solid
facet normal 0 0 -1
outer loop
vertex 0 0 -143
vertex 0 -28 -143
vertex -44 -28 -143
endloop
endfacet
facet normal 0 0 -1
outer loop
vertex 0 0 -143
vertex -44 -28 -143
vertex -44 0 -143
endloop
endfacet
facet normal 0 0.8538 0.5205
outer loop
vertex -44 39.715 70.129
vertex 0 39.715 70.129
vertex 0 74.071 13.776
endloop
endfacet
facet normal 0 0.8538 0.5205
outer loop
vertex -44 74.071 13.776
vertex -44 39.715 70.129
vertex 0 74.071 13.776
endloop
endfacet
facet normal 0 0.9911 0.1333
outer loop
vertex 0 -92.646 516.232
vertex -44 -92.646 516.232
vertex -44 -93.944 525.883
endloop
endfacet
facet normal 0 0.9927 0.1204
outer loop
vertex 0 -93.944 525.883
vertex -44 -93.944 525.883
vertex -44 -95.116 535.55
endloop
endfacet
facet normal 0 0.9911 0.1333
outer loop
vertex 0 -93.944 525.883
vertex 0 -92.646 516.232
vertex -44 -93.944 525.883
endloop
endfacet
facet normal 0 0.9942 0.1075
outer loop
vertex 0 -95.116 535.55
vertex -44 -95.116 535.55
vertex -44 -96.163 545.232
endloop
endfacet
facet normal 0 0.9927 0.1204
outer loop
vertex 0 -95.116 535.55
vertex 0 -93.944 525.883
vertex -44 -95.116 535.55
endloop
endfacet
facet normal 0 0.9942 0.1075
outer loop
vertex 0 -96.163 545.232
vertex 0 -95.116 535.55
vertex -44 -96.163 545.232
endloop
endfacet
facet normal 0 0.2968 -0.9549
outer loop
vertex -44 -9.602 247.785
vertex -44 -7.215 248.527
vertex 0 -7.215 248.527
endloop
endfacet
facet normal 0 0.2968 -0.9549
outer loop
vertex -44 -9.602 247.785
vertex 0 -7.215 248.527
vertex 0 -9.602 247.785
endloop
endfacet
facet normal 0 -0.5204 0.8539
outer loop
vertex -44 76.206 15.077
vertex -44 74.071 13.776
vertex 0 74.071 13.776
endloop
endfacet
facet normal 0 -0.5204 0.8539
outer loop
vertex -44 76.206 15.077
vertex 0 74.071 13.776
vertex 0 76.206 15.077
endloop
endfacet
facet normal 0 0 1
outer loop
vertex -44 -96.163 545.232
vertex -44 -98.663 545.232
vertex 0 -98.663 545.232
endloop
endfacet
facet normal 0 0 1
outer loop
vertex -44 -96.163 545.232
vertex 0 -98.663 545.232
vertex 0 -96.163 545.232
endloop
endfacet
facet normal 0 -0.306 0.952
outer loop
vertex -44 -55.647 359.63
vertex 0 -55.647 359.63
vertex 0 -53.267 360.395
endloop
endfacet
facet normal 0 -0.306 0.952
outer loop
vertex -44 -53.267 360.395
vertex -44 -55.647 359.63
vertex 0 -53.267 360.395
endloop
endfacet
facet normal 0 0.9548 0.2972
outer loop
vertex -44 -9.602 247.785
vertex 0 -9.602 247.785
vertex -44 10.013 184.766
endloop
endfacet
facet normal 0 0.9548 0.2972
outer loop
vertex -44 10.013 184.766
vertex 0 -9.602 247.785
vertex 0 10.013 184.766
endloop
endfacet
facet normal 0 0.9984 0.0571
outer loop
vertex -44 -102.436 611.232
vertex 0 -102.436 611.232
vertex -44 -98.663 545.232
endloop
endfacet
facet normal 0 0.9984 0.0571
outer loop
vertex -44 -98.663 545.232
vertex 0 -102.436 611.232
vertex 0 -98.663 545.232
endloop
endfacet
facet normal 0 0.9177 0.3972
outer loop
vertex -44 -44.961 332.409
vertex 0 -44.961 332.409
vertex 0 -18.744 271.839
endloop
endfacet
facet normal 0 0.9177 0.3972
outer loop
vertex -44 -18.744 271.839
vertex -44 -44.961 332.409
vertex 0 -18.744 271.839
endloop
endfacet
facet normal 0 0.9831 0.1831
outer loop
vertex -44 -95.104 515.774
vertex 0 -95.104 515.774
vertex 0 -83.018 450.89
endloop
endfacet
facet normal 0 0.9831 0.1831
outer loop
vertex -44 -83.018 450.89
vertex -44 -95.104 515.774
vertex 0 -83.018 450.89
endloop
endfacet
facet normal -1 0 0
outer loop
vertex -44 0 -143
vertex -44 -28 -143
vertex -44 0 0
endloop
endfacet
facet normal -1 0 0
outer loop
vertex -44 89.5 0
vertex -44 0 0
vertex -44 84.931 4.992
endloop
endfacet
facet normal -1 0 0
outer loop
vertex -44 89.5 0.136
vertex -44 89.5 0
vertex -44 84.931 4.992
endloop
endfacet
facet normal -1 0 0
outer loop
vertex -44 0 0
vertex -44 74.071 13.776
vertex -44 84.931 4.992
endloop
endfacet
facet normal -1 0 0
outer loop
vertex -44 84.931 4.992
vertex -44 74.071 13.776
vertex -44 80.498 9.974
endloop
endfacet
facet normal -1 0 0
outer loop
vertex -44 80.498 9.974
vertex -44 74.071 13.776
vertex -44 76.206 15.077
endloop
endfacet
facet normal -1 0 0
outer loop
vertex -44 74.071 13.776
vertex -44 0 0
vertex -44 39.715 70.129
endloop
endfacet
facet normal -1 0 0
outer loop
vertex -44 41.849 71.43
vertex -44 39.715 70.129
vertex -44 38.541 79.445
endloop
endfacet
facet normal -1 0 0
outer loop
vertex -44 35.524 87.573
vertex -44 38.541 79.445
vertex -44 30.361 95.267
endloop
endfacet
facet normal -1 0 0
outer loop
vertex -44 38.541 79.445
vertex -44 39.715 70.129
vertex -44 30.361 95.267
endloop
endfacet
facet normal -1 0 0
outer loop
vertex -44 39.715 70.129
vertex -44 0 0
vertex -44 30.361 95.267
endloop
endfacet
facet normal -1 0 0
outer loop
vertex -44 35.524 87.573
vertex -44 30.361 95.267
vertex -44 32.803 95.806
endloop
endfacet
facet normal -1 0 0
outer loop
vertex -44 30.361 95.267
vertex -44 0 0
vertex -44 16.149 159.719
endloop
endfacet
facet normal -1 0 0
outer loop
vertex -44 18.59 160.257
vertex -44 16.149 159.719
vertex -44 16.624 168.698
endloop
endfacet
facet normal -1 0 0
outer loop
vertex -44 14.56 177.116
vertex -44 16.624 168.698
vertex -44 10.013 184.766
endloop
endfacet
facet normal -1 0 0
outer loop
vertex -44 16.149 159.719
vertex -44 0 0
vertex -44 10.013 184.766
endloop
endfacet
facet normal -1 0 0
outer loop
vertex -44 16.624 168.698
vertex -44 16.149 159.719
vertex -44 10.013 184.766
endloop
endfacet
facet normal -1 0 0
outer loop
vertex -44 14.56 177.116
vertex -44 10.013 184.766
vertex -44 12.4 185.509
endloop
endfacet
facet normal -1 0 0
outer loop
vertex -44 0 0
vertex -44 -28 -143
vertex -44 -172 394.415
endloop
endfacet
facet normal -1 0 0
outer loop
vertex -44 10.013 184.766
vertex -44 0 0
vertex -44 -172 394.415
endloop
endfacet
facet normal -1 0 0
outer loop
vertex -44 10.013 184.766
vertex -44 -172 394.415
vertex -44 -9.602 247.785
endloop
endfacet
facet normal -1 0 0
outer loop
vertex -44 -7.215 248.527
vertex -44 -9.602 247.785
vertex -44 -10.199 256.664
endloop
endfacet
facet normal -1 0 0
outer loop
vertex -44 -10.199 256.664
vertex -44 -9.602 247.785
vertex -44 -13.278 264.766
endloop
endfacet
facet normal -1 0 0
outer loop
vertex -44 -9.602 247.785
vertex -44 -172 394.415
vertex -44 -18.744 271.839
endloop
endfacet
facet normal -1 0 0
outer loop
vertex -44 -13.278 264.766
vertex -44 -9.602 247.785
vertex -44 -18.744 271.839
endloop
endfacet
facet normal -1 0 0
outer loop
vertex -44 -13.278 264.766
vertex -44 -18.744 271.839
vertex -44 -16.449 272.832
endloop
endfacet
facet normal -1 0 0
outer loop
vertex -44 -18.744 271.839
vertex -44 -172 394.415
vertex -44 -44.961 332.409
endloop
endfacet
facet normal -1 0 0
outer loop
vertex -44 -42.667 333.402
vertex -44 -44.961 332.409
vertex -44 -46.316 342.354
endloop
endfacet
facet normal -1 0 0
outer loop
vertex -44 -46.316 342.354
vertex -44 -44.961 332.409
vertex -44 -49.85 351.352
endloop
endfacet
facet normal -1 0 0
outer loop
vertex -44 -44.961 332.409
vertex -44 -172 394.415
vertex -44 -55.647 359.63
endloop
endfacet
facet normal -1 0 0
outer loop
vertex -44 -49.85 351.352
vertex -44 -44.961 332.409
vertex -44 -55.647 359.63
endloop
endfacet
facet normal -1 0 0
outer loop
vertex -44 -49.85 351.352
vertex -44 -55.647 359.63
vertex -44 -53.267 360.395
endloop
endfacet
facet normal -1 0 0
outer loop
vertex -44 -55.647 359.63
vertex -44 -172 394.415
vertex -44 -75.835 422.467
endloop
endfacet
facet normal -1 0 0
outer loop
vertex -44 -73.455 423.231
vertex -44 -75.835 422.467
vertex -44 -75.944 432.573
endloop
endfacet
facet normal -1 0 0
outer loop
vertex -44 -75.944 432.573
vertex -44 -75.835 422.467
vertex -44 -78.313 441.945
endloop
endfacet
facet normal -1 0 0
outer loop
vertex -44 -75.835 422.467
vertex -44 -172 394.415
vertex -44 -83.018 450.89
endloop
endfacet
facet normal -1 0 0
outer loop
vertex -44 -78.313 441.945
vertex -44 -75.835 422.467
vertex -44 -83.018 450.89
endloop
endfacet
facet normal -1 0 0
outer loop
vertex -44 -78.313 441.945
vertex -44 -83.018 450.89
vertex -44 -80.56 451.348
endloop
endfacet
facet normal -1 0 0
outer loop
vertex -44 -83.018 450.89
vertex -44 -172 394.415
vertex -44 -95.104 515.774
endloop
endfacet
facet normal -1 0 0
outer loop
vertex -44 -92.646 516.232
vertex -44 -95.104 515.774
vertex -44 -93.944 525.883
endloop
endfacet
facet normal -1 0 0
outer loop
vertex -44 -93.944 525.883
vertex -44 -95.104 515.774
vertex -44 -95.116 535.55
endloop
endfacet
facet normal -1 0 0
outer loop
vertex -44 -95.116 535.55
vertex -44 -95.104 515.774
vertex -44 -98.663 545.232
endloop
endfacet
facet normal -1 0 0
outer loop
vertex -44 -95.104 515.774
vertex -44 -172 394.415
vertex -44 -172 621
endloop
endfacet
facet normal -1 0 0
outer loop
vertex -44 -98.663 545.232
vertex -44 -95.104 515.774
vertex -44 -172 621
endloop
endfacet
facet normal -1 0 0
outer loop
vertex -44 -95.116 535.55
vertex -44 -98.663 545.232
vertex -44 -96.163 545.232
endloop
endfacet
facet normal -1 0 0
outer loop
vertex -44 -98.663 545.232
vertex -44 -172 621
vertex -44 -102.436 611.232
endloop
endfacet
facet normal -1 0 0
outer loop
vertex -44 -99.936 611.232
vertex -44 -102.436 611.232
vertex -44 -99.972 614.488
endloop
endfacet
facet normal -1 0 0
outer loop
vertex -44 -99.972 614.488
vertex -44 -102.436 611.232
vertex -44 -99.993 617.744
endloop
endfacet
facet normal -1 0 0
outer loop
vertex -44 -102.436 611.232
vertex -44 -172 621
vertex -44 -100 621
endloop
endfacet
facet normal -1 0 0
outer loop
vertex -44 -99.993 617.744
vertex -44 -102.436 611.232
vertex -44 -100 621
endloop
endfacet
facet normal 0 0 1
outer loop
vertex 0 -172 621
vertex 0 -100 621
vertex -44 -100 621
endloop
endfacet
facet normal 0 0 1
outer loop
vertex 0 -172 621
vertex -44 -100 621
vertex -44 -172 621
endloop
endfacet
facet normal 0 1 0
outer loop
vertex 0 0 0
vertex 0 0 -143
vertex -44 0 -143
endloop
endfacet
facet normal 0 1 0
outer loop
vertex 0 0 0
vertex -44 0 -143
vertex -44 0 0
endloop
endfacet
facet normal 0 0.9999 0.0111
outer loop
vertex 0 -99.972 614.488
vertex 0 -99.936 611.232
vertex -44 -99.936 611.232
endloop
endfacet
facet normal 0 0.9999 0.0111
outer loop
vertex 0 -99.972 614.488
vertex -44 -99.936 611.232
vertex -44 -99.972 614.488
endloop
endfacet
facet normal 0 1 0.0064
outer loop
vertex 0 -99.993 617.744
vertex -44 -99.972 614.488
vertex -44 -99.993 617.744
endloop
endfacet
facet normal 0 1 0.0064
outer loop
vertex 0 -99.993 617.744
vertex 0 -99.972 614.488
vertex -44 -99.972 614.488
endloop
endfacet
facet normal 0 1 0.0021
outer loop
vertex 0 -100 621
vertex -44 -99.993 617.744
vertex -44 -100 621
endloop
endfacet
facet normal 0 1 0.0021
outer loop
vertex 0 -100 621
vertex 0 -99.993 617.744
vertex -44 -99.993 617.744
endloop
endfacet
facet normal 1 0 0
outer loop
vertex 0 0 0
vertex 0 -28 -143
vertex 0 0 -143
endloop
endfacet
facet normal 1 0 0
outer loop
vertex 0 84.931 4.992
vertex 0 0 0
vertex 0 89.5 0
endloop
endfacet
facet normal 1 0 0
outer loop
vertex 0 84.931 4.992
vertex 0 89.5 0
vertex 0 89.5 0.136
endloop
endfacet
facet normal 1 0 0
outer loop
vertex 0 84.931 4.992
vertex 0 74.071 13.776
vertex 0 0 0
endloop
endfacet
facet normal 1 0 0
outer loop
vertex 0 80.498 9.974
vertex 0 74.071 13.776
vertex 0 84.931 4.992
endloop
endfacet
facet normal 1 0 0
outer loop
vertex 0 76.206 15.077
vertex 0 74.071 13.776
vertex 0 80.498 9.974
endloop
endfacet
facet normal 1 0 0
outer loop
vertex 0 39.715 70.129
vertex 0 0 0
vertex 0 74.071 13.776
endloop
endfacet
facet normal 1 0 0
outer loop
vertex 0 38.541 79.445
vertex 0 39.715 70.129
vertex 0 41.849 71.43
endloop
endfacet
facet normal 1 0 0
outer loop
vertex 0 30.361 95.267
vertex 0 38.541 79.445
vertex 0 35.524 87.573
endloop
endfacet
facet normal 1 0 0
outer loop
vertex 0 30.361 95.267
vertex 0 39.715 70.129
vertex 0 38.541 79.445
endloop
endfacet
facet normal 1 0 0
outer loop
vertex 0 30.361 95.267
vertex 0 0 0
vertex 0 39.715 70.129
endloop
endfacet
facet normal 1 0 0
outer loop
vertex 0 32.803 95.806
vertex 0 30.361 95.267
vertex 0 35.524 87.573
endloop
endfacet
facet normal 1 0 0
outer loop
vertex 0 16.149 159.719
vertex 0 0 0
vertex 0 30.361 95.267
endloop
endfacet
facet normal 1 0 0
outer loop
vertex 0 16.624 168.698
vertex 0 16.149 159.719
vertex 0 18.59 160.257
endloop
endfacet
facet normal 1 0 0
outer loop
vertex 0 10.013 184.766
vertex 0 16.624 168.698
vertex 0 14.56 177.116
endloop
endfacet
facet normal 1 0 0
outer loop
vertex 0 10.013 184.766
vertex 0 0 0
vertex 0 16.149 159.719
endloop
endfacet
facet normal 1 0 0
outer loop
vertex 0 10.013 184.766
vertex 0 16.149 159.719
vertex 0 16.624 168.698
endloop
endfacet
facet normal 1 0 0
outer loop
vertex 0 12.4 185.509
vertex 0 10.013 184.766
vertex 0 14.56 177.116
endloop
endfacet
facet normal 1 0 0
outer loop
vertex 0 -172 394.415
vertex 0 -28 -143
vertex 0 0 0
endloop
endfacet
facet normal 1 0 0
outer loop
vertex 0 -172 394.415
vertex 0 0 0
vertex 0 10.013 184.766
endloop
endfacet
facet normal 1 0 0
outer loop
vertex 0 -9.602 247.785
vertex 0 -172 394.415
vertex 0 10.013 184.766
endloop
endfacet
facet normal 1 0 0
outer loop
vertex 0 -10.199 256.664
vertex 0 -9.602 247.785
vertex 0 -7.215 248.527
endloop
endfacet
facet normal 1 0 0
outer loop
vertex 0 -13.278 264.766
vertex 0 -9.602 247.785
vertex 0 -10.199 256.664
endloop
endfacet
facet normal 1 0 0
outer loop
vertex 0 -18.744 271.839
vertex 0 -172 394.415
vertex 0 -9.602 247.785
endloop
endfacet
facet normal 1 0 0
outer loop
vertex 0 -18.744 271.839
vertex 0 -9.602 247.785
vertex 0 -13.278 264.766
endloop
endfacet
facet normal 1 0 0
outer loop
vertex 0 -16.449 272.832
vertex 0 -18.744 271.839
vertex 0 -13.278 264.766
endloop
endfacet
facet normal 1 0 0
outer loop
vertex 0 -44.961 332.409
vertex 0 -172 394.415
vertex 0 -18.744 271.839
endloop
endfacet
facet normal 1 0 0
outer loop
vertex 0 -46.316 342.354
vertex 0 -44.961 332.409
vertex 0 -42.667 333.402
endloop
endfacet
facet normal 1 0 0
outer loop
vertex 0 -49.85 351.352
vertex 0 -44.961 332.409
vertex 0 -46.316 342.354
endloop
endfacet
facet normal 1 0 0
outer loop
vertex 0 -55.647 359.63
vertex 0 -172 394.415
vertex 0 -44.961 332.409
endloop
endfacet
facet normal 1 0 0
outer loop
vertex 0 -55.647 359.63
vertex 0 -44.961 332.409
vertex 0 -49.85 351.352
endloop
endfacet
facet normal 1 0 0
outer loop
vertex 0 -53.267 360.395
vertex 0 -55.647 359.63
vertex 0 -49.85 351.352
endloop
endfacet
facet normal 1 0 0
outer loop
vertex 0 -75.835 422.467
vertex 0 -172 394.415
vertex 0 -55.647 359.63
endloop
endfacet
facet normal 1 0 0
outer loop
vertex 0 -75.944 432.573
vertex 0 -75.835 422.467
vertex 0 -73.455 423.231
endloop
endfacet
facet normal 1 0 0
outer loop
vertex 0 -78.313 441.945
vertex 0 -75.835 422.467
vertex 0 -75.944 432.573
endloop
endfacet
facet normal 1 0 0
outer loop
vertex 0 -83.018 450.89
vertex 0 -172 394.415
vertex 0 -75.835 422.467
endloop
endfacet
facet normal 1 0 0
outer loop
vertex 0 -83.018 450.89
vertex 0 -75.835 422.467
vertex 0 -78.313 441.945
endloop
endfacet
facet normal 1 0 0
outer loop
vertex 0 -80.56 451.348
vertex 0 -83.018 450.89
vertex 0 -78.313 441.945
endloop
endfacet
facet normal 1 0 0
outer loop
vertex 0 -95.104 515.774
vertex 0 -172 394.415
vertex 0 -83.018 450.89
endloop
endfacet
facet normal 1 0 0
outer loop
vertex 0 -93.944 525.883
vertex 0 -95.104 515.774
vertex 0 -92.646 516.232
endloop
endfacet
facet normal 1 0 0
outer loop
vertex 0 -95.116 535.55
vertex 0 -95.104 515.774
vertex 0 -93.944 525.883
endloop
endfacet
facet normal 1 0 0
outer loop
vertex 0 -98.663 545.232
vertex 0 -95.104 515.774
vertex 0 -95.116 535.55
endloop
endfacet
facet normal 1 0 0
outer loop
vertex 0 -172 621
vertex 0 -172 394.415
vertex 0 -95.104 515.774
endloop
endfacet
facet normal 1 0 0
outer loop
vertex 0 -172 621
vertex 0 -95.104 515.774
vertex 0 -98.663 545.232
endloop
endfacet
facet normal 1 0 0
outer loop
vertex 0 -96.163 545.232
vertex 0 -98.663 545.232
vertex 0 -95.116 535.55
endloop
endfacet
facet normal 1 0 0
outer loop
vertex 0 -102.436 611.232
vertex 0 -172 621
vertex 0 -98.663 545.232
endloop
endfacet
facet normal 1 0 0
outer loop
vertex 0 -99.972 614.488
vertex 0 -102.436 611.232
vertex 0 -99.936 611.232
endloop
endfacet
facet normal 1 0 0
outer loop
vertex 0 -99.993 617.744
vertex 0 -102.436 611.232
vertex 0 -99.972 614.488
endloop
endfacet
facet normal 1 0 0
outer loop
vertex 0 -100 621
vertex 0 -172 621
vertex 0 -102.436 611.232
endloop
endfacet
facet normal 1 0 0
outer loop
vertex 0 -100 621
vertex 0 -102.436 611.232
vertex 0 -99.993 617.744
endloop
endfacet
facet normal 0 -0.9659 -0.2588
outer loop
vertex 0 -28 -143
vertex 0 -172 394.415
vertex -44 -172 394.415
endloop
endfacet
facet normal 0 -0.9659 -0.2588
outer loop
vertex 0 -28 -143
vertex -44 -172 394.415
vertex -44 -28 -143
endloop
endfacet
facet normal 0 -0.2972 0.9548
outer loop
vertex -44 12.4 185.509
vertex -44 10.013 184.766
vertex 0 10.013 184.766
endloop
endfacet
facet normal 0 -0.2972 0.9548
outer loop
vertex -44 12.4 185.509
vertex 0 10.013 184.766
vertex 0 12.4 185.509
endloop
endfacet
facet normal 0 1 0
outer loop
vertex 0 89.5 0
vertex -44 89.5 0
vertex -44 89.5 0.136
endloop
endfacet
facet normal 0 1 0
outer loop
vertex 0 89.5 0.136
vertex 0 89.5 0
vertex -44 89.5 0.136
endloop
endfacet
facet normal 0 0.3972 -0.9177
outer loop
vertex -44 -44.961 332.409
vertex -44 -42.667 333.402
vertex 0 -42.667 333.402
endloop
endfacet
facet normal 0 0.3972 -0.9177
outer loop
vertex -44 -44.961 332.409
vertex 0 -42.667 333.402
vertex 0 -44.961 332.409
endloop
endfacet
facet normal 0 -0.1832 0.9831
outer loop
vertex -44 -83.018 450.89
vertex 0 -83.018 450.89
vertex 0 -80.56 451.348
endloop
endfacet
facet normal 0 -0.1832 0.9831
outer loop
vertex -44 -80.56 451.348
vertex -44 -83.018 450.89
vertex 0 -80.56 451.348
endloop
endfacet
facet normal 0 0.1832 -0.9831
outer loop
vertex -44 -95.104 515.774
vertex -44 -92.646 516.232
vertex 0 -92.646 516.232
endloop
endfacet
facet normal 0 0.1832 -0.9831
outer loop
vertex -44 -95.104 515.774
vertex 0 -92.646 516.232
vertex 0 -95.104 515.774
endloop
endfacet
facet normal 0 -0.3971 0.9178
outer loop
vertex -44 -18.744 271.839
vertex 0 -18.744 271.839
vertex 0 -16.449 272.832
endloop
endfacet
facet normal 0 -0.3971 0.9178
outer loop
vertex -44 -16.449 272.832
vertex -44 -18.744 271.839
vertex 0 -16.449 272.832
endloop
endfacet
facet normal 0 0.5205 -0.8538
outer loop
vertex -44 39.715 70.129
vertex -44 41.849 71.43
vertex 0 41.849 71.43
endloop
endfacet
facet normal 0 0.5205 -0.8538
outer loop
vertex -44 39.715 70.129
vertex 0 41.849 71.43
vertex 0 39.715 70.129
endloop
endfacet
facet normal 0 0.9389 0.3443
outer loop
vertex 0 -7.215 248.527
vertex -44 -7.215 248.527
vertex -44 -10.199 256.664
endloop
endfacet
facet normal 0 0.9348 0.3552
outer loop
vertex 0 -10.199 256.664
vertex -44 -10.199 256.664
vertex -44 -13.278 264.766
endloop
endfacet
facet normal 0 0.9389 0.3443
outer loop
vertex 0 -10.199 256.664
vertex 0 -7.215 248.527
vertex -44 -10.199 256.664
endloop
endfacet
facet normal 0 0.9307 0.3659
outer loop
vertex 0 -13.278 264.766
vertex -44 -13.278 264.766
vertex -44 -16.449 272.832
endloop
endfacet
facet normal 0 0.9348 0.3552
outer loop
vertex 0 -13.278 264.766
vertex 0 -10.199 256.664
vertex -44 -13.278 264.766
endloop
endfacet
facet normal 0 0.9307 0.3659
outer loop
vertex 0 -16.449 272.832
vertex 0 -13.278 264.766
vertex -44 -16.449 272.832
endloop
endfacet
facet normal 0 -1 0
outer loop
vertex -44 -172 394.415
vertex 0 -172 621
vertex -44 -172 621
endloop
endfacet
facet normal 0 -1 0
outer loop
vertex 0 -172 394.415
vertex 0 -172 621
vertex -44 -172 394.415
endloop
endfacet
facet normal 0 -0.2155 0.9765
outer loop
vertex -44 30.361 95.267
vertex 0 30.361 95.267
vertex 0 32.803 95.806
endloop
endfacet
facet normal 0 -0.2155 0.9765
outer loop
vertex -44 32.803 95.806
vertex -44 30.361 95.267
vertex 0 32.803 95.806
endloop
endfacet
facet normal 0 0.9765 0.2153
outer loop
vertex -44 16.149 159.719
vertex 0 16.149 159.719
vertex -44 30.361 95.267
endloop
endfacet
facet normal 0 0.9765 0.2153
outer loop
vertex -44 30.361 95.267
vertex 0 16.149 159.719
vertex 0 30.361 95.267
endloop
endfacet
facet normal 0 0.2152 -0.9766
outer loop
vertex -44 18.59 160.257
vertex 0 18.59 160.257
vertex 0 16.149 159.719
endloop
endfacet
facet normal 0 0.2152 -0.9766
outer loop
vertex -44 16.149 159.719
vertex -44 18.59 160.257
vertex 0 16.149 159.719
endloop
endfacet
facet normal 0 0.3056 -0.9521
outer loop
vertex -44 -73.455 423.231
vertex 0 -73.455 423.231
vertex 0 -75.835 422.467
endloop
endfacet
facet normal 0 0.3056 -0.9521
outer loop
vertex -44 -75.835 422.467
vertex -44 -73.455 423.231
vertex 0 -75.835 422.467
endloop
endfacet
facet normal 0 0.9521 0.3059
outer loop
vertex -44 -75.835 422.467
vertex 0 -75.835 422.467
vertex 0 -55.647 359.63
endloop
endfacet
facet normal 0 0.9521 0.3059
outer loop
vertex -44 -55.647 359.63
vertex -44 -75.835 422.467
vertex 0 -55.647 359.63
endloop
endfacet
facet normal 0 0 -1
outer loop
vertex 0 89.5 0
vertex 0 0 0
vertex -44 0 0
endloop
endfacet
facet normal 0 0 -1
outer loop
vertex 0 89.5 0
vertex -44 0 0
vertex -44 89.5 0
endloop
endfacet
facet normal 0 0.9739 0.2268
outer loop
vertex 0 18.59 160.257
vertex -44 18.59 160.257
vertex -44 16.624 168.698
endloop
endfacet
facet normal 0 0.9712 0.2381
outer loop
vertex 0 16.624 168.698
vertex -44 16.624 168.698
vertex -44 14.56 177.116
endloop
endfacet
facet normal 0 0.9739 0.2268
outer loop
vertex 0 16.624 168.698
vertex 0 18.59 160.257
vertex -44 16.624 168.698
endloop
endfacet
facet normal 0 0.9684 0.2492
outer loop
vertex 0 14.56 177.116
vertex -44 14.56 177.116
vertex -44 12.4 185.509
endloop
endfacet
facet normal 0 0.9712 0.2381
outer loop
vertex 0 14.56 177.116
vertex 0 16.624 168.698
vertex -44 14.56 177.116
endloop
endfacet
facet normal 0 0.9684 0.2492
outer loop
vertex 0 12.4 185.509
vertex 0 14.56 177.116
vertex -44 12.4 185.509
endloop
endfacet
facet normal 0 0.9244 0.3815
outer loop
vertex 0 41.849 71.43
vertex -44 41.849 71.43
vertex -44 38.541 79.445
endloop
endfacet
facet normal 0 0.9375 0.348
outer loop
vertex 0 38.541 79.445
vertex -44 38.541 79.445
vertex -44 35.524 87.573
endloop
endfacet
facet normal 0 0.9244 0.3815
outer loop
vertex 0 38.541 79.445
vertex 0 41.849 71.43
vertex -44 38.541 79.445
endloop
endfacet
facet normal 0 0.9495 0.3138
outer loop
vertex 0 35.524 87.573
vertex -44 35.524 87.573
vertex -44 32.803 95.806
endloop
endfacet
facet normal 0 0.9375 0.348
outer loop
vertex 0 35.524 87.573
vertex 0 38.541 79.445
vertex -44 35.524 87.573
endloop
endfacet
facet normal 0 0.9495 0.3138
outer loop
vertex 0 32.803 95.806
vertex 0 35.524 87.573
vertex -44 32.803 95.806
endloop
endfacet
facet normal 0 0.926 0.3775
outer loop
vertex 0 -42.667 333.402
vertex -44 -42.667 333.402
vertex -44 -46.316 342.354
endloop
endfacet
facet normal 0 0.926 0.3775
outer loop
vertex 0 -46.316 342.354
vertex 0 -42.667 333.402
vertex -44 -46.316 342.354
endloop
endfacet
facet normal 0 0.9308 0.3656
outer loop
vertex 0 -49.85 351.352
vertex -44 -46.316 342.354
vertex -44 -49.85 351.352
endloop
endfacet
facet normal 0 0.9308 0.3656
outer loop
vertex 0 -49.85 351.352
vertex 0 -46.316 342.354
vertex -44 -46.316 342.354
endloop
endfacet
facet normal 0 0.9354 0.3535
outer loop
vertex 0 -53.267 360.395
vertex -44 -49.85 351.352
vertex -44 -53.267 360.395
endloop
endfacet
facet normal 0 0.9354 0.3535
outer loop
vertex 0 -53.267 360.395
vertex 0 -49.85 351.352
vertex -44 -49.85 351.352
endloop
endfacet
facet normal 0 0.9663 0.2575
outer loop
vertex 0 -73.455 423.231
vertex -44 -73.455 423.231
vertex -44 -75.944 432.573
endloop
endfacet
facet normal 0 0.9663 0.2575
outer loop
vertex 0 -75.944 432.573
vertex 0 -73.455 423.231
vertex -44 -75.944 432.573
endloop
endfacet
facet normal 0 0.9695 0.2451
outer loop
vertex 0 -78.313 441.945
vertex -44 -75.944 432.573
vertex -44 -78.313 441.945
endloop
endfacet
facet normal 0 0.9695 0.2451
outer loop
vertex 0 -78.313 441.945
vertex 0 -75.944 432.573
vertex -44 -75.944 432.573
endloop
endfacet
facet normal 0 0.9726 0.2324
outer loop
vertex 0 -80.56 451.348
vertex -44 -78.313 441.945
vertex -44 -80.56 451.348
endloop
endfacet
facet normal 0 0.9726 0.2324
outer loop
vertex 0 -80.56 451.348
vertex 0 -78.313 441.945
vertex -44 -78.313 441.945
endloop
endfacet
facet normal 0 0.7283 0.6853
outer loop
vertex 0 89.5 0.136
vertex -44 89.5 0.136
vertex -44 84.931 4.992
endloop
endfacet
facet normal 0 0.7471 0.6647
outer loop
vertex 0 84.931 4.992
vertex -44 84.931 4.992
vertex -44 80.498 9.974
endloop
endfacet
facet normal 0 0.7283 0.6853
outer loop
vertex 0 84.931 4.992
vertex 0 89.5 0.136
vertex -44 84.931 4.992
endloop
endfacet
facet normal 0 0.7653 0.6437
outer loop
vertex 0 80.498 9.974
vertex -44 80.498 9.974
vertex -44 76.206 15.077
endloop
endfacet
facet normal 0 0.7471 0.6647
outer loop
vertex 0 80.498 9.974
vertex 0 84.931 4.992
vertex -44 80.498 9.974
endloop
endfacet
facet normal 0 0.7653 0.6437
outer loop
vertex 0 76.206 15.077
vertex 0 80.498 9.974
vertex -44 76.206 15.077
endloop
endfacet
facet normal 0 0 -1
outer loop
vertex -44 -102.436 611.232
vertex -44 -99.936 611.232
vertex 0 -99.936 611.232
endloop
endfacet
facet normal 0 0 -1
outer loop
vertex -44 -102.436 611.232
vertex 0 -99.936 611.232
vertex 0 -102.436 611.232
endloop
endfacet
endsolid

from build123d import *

# Parameters (mm, degrees)
F1_DEPTH = 44
F3_DEPTH = 44.001


with BuildPart() as f1:
    # F0 (on Right) → F1 (new body)
    with BuildSketch(Plane.YZ):
        with BuildLine():
            Line((0, -143), (0, 0))
            Line((0, 0), (89.5, 0))
            Line((89.5, 0), (89.5, 0.135534))
            ThreePointArc((89.5, 0.135534), (48.246456, 57.869699), (25.678122, 125.143461))
            ThreePointArc((25.678122, 125.143461), (2.97396, 218.234418), (-31.413874, 307.670888))
            ThreePointArc((-31.413874, 307.670888), (-82.652853, 460.62607), (-100, 621))
            Line((-100, 621), (-172, 621))
            Line((-172, 621), (-172, 394.415316))
            Line((-172, 394.415316), (-28, -143))
            Line((-28, -143), (0, -143))
        make_face()
    extrude(amount=-F1_DEPTH)

    # F2 (on face) → F3 (cut, through all)
    with BuildSketch(Plane.YZ):
        Polygon((74.071089, 13.776057), (76.205662, 15.077441), (41.849131, 71.430158), (39.714558, 70.128774), align=None)
        Polygon((30.361442, 95.267272), (32.802788, 95.805631), (19.715373, 160.494236), (18.590111, 160.257162), (16.148766, 159.718803), align=None)
        Polygon((10.012695, 184.7665), (12.399741, 185.509475), (-3.192727, 249.82656), (-7.214805, 248.527485), (-9.601851, 247.78451), align=None)
        Polygon((-18.74354, 271.839235), (-16.449247, 272.832322), (-40.185015, 334.475862), (-42.666724, 333.401653), (-44.961017, 332.408567), align=None)
        Polygon((-55.647484, 359.630059), (-53.267308, 360.394756), (-73.455309, 423.231407), (-75.835485, 422.46671), align=None)
        Polygon((-92.64633, 516.231548), (-95.104054, 515.773736), (-83.017833, 450.889815), (-80.560108, 451.347626), align=None)
        Polygon((-98.662946, 545.231548), (-96.162946, 545.231548), (-99.936382, 611.231548), (-102.436382, 611.231548), align=None)
    extrude(amount=-F3_DEPTH, mode=Mode.SUBTRACT)


solid = f1.part
